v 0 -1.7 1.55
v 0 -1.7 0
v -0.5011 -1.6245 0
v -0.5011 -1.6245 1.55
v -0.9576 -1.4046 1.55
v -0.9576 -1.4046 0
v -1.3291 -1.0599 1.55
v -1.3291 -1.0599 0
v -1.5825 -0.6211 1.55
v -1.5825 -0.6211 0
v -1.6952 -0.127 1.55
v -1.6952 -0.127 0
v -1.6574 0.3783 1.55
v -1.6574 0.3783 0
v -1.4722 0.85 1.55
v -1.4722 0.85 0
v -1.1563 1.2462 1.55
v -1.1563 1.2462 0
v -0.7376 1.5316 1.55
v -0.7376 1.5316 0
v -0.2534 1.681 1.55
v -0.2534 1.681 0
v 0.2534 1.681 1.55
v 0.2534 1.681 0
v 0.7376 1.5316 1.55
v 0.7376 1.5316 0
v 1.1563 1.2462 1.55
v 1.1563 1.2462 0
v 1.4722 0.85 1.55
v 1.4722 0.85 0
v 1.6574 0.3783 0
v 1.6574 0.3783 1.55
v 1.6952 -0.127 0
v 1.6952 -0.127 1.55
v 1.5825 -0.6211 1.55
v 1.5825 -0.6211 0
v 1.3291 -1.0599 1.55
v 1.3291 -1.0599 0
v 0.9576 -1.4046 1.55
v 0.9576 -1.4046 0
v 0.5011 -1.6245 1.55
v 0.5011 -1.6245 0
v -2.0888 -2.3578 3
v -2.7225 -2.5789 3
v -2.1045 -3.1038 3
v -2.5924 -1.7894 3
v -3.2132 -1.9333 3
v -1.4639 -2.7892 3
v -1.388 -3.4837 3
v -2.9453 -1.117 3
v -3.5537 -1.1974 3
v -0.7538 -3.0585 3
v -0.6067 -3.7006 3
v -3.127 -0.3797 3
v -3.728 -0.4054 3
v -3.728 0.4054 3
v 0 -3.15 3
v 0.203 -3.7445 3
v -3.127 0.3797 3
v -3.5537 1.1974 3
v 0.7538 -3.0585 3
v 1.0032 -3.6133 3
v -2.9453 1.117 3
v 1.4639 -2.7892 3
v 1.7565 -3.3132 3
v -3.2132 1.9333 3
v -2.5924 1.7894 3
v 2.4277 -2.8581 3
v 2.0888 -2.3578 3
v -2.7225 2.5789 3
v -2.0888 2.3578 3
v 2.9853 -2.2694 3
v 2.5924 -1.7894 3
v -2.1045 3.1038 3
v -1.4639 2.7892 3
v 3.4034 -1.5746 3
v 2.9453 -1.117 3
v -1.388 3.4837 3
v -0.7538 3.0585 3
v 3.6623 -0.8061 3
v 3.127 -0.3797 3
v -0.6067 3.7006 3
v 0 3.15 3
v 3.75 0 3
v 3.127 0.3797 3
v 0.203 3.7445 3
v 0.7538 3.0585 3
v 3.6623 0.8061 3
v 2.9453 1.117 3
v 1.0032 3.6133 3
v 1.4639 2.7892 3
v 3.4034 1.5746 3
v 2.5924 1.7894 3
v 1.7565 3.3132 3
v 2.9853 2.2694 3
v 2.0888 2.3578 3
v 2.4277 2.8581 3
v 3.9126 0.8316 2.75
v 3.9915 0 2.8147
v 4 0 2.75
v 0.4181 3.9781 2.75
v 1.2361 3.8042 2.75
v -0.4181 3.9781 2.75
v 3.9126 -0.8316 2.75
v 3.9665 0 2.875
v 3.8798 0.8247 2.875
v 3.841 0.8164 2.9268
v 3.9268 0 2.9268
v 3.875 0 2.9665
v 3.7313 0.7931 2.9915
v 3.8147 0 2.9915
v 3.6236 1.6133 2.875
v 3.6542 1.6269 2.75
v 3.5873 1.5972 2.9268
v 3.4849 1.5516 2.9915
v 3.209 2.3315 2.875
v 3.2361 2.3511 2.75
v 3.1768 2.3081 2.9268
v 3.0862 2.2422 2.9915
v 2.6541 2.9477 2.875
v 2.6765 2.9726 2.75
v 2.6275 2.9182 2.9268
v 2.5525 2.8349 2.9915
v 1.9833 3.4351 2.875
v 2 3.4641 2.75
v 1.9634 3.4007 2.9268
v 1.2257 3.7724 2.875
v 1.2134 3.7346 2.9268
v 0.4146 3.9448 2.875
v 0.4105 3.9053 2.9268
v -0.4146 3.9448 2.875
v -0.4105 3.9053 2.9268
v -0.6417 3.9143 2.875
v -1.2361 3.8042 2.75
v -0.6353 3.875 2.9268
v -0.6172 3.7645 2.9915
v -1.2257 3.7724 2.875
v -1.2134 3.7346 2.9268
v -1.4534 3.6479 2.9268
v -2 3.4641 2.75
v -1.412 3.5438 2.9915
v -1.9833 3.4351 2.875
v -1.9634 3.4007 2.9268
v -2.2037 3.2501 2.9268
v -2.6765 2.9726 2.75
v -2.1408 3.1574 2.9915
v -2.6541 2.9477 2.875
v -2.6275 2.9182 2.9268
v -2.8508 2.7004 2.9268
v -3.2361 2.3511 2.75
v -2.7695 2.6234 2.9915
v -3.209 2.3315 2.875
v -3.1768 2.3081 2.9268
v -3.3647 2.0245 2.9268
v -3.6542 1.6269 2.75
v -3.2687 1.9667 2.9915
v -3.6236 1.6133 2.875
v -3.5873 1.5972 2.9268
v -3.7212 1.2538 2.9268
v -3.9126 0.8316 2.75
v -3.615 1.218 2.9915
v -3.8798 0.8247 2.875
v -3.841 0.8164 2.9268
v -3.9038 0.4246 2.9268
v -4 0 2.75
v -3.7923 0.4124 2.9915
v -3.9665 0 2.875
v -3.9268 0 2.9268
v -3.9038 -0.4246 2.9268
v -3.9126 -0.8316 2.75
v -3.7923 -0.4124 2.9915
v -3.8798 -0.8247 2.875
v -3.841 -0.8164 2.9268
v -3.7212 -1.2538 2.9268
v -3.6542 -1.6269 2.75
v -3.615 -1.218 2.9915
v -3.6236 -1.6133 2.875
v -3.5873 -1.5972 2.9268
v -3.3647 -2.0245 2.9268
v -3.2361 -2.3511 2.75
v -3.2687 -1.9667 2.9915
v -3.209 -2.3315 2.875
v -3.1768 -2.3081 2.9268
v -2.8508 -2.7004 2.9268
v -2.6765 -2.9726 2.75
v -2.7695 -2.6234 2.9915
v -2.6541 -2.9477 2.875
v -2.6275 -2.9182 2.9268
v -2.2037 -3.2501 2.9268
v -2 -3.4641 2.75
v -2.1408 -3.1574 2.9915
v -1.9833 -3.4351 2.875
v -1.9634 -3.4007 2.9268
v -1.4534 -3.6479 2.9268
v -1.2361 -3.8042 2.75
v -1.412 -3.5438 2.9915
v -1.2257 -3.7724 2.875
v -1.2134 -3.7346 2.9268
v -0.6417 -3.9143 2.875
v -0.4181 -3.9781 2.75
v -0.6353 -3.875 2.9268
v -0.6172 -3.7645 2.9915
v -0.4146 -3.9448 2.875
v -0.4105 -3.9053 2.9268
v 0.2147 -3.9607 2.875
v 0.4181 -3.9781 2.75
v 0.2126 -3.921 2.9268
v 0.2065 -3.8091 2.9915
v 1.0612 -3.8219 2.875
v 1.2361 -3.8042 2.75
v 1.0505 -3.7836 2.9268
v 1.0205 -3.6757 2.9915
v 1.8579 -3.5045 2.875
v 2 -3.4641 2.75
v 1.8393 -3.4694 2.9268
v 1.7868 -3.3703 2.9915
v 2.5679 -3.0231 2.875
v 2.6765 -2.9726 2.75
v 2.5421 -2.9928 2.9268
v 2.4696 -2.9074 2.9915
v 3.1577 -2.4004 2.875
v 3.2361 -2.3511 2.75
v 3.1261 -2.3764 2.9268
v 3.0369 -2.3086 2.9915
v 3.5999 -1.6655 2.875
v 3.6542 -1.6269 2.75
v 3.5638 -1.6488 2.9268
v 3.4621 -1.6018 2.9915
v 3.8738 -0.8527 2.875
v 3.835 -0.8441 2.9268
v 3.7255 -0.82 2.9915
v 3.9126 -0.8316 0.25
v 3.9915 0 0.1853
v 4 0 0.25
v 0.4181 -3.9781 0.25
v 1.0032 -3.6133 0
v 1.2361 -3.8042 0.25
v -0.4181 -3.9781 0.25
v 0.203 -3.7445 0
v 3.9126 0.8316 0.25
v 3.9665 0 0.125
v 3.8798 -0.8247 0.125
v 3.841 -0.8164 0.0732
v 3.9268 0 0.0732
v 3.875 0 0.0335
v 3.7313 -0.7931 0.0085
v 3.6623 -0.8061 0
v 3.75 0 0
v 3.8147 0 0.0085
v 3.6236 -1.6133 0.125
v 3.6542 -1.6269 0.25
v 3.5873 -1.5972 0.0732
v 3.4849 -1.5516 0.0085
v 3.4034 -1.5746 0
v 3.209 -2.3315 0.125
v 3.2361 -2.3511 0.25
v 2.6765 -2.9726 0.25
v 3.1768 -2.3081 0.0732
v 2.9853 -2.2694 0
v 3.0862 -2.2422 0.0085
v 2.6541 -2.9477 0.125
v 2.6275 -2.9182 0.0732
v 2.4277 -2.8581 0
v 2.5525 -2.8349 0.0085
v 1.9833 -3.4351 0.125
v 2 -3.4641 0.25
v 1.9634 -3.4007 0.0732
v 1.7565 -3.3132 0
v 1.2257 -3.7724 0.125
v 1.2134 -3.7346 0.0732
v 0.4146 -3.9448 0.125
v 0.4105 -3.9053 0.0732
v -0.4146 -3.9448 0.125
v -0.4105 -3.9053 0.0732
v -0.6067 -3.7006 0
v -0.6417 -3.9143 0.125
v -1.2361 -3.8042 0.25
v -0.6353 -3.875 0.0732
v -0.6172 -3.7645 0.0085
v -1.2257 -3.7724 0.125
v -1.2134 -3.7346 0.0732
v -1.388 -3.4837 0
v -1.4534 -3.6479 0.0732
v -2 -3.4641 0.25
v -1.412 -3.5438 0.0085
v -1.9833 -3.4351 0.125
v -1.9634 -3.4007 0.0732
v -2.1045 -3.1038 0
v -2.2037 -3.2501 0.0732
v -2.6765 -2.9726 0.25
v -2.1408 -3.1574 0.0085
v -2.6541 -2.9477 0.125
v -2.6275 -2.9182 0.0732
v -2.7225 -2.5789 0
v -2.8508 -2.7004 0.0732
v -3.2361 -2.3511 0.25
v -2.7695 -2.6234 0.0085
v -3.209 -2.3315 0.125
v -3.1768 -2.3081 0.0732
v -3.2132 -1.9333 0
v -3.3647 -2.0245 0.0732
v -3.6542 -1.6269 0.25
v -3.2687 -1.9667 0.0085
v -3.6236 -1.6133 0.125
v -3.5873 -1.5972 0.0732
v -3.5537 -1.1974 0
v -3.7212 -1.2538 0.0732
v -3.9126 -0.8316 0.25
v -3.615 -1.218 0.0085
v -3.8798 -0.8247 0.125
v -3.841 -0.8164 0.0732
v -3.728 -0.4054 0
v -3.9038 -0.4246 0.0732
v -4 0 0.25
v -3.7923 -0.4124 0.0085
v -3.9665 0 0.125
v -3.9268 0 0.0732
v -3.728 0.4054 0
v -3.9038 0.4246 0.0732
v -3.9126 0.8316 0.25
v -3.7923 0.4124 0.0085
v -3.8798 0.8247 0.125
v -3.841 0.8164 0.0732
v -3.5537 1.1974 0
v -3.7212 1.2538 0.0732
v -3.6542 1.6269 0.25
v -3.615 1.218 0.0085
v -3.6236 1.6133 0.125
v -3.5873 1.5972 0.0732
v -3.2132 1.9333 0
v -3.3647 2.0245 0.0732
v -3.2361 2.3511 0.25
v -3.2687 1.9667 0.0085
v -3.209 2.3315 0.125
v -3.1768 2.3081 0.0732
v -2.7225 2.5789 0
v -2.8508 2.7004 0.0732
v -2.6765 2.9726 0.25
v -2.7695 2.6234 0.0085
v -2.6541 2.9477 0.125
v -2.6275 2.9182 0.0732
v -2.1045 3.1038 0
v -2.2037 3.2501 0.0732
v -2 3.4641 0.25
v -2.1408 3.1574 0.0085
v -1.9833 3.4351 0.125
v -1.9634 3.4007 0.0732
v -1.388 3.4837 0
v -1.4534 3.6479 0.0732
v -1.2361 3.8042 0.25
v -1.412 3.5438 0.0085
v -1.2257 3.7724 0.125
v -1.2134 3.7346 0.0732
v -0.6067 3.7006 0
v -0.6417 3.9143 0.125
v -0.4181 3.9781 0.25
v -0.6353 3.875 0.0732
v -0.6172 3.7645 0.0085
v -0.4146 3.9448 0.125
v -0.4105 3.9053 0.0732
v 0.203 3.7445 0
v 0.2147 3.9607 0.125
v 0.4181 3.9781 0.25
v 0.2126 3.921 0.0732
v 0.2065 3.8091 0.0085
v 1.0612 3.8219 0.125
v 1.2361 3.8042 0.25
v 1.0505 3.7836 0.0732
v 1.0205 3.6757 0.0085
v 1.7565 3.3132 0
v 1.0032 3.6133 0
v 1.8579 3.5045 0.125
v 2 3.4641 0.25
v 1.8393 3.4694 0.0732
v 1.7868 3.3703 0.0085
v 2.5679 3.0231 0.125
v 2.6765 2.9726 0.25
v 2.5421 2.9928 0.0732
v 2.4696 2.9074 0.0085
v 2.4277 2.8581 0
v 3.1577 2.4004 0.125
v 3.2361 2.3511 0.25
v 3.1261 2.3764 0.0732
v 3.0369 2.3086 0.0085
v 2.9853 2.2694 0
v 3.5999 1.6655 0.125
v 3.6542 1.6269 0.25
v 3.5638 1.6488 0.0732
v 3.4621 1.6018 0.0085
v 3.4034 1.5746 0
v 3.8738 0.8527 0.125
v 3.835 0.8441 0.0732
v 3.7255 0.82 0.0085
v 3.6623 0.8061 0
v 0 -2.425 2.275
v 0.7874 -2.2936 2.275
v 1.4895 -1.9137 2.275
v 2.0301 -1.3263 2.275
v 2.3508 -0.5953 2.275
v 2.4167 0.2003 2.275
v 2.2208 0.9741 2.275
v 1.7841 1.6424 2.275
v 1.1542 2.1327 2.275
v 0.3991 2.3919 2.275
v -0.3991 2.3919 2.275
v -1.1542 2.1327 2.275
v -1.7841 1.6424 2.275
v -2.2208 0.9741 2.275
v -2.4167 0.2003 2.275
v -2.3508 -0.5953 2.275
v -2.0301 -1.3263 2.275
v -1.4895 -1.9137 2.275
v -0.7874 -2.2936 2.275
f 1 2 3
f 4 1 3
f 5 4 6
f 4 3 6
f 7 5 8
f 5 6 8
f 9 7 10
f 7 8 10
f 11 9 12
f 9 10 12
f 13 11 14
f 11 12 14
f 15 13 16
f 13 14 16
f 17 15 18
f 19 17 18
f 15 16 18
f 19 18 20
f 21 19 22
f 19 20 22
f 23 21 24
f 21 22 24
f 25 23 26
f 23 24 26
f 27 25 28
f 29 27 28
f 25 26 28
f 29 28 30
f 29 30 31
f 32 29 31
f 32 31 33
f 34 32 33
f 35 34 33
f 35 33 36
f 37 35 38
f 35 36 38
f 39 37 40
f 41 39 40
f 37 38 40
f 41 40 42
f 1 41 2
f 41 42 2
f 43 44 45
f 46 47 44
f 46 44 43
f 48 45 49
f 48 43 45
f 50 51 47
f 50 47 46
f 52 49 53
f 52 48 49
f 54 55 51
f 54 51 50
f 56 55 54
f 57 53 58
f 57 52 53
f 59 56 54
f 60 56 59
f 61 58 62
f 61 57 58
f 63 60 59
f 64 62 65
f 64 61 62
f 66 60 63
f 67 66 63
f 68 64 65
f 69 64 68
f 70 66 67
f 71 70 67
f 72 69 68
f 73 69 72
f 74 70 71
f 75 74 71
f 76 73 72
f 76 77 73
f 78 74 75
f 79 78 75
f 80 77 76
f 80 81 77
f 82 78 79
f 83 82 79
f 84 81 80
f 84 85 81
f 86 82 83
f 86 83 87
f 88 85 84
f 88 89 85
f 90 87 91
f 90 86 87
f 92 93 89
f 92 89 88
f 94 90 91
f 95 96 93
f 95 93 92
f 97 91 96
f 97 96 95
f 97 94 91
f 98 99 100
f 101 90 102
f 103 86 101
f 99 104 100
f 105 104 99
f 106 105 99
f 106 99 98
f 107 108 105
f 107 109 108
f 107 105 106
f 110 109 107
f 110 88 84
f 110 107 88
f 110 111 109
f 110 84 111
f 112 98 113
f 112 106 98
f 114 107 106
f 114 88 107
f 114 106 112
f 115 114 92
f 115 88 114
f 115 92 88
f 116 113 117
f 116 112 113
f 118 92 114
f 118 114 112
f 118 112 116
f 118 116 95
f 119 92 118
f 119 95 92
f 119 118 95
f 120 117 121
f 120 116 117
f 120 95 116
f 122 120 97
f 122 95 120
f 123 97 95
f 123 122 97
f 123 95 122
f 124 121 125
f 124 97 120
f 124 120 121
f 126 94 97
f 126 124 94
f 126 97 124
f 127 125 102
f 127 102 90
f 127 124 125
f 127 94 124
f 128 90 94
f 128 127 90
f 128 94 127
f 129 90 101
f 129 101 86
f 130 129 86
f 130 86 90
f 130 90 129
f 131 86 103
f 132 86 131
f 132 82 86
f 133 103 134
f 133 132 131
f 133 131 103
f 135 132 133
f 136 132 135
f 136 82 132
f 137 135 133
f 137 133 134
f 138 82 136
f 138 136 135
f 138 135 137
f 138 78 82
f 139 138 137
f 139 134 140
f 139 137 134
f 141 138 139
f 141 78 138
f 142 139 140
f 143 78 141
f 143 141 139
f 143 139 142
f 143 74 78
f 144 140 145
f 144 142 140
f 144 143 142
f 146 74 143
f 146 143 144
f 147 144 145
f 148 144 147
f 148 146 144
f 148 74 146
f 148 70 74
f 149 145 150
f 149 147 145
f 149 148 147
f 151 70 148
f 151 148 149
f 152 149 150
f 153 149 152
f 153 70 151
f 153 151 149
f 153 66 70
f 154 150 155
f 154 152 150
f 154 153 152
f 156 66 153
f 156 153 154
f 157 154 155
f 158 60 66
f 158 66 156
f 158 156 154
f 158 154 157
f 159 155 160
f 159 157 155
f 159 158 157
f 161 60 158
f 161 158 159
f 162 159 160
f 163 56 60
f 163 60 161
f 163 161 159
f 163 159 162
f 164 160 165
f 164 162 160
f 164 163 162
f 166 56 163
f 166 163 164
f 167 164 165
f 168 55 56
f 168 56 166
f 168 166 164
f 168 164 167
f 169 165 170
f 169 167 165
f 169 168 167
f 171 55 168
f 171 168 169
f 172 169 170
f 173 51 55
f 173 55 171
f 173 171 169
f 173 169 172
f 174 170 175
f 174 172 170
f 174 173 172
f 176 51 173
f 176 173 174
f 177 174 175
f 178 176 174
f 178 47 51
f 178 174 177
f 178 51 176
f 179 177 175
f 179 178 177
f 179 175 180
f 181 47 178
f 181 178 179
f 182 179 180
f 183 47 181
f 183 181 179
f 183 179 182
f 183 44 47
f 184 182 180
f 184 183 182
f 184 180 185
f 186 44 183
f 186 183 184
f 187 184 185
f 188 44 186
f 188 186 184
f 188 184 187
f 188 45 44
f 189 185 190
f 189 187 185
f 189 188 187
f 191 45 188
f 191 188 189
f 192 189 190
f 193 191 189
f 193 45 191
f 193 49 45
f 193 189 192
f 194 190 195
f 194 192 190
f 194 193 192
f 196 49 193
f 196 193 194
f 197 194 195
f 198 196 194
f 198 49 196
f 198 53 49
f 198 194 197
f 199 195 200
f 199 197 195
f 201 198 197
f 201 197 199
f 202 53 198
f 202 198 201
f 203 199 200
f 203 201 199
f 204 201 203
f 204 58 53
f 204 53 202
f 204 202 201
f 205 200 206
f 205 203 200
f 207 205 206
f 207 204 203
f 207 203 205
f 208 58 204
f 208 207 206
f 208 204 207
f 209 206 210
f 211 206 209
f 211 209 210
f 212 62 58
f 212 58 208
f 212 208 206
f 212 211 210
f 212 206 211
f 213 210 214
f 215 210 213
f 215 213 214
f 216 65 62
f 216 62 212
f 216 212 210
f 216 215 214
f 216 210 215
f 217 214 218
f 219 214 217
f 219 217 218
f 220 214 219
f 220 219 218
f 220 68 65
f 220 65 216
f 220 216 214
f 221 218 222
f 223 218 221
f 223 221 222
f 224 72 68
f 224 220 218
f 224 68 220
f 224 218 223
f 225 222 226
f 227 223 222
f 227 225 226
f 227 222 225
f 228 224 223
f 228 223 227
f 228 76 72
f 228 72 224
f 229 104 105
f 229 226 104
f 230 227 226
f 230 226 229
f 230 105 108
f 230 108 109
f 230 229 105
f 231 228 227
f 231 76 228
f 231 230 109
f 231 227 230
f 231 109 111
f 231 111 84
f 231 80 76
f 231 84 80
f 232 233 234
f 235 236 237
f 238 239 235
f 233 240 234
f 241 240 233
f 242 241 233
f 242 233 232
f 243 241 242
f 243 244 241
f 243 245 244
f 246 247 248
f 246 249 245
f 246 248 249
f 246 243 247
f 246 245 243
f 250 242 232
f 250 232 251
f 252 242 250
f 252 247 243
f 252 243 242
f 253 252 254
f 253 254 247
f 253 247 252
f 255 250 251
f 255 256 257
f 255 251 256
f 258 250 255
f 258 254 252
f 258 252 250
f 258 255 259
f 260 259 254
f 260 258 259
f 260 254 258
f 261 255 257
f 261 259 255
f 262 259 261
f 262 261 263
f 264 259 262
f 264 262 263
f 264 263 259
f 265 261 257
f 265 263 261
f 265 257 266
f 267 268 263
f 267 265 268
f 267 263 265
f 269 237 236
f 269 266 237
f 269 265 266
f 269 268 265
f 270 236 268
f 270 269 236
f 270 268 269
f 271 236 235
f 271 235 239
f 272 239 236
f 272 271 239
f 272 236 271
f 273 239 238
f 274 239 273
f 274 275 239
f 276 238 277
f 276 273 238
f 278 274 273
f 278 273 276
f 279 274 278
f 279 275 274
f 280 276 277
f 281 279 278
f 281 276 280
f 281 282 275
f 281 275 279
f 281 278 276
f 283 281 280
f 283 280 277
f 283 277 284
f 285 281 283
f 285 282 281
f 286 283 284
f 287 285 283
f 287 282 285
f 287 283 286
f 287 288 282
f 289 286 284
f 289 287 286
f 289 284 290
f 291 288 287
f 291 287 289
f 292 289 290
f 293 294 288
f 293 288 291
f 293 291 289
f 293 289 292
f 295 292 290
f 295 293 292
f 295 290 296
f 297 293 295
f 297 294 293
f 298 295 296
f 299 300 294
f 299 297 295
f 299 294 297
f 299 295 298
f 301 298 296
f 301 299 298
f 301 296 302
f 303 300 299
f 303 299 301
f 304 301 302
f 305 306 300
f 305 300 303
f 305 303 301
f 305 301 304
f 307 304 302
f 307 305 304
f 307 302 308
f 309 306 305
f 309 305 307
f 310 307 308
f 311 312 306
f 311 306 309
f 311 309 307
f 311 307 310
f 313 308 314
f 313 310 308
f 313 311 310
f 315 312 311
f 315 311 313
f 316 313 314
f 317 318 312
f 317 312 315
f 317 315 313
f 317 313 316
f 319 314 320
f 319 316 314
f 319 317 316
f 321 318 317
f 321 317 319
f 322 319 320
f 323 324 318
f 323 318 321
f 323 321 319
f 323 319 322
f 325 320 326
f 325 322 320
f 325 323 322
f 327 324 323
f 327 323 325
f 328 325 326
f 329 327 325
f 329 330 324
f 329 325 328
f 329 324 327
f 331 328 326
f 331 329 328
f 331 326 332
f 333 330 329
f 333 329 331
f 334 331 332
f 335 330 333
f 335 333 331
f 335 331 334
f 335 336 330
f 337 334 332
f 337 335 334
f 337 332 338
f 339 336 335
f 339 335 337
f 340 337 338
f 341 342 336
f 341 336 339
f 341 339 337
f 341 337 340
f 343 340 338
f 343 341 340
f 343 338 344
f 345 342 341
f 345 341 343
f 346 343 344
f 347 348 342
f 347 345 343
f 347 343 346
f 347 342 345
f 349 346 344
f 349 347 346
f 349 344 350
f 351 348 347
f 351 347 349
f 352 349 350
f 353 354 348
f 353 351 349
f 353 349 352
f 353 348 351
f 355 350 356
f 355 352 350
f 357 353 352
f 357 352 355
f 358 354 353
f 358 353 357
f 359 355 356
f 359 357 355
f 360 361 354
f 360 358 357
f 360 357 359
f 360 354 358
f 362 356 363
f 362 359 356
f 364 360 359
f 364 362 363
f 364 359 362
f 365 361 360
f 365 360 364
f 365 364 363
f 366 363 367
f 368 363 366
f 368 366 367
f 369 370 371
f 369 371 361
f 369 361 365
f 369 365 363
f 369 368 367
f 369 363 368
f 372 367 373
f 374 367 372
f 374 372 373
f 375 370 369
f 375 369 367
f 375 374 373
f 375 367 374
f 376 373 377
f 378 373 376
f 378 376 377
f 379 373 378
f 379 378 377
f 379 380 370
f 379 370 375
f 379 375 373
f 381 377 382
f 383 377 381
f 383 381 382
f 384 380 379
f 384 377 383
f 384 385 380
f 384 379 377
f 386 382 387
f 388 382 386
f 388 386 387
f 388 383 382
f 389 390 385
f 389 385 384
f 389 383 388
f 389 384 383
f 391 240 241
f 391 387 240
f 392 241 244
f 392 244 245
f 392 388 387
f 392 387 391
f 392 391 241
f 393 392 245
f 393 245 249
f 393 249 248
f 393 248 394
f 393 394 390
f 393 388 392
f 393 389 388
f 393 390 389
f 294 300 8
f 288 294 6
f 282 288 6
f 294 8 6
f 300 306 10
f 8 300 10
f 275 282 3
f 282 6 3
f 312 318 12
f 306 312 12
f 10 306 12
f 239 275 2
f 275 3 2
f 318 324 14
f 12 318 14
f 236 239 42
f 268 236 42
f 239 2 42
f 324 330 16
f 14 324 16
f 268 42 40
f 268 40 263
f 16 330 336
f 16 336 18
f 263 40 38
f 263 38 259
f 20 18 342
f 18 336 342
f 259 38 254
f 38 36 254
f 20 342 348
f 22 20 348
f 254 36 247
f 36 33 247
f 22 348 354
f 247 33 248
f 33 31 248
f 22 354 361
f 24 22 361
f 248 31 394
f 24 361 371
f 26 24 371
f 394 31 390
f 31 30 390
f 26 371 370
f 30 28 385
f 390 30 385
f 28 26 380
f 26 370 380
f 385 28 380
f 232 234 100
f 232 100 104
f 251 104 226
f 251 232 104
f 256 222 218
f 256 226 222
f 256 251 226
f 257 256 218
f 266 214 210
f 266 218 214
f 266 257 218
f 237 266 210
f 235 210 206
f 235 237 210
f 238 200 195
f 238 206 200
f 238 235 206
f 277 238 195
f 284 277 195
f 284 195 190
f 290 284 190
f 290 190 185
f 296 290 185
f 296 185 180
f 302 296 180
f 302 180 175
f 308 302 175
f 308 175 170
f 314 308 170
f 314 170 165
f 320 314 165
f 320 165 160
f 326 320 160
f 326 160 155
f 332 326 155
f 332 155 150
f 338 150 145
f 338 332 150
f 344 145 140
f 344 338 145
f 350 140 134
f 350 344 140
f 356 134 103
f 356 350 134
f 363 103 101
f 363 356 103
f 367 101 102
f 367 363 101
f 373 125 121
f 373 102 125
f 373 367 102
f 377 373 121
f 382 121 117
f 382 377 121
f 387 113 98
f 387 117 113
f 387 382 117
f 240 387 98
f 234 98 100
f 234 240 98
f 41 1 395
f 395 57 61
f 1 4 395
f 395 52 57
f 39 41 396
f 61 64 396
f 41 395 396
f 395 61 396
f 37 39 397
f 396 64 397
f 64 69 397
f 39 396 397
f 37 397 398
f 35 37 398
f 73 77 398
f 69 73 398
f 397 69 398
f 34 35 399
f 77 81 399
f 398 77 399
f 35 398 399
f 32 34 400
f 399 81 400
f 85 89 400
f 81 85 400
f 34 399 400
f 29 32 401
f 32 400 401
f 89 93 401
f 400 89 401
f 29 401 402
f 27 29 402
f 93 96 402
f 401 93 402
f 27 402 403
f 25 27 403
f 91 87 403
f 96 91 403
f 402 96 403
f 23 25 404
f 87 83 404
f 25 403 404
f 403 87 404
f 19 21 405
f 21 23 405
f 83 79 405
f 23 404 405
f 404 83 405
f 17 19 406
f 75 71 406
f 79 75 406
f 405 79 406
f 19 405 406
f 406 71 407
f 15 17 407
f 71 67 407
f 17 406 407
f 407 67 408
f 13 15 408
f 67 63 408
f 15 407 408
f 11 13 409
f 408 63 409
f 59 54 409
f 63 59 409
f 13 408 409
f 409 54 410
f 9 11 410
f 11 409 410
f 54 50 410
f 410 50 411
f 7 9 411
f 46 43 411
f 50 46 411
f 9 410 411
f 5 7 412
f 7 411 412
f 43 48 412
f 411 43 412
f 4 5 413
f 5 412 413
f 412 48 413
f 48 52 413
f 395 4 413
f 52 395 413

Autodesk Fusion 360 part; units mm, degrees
sketch "Sketch1" plane through (0, 0, 0) normal (0, 0, 1) x (1, 0, 0)
  circle A0 centre (0, 0) radius 4
  dimension "d1" = 8
extrude "Extrude1" add sketch "Sketch1" along normal blind 3
hole "Hole1" at (0, 0, 3) direction (0, 0, -1) diameter 3.4 depth 8 tip angle 118 countersink diameter 6.3 countersink angle 90
fillet "Fillet1" radius 0.25 2 edges at (-3.7293, -1.4465, 0) (-3.7293, -1.4465, 3)
